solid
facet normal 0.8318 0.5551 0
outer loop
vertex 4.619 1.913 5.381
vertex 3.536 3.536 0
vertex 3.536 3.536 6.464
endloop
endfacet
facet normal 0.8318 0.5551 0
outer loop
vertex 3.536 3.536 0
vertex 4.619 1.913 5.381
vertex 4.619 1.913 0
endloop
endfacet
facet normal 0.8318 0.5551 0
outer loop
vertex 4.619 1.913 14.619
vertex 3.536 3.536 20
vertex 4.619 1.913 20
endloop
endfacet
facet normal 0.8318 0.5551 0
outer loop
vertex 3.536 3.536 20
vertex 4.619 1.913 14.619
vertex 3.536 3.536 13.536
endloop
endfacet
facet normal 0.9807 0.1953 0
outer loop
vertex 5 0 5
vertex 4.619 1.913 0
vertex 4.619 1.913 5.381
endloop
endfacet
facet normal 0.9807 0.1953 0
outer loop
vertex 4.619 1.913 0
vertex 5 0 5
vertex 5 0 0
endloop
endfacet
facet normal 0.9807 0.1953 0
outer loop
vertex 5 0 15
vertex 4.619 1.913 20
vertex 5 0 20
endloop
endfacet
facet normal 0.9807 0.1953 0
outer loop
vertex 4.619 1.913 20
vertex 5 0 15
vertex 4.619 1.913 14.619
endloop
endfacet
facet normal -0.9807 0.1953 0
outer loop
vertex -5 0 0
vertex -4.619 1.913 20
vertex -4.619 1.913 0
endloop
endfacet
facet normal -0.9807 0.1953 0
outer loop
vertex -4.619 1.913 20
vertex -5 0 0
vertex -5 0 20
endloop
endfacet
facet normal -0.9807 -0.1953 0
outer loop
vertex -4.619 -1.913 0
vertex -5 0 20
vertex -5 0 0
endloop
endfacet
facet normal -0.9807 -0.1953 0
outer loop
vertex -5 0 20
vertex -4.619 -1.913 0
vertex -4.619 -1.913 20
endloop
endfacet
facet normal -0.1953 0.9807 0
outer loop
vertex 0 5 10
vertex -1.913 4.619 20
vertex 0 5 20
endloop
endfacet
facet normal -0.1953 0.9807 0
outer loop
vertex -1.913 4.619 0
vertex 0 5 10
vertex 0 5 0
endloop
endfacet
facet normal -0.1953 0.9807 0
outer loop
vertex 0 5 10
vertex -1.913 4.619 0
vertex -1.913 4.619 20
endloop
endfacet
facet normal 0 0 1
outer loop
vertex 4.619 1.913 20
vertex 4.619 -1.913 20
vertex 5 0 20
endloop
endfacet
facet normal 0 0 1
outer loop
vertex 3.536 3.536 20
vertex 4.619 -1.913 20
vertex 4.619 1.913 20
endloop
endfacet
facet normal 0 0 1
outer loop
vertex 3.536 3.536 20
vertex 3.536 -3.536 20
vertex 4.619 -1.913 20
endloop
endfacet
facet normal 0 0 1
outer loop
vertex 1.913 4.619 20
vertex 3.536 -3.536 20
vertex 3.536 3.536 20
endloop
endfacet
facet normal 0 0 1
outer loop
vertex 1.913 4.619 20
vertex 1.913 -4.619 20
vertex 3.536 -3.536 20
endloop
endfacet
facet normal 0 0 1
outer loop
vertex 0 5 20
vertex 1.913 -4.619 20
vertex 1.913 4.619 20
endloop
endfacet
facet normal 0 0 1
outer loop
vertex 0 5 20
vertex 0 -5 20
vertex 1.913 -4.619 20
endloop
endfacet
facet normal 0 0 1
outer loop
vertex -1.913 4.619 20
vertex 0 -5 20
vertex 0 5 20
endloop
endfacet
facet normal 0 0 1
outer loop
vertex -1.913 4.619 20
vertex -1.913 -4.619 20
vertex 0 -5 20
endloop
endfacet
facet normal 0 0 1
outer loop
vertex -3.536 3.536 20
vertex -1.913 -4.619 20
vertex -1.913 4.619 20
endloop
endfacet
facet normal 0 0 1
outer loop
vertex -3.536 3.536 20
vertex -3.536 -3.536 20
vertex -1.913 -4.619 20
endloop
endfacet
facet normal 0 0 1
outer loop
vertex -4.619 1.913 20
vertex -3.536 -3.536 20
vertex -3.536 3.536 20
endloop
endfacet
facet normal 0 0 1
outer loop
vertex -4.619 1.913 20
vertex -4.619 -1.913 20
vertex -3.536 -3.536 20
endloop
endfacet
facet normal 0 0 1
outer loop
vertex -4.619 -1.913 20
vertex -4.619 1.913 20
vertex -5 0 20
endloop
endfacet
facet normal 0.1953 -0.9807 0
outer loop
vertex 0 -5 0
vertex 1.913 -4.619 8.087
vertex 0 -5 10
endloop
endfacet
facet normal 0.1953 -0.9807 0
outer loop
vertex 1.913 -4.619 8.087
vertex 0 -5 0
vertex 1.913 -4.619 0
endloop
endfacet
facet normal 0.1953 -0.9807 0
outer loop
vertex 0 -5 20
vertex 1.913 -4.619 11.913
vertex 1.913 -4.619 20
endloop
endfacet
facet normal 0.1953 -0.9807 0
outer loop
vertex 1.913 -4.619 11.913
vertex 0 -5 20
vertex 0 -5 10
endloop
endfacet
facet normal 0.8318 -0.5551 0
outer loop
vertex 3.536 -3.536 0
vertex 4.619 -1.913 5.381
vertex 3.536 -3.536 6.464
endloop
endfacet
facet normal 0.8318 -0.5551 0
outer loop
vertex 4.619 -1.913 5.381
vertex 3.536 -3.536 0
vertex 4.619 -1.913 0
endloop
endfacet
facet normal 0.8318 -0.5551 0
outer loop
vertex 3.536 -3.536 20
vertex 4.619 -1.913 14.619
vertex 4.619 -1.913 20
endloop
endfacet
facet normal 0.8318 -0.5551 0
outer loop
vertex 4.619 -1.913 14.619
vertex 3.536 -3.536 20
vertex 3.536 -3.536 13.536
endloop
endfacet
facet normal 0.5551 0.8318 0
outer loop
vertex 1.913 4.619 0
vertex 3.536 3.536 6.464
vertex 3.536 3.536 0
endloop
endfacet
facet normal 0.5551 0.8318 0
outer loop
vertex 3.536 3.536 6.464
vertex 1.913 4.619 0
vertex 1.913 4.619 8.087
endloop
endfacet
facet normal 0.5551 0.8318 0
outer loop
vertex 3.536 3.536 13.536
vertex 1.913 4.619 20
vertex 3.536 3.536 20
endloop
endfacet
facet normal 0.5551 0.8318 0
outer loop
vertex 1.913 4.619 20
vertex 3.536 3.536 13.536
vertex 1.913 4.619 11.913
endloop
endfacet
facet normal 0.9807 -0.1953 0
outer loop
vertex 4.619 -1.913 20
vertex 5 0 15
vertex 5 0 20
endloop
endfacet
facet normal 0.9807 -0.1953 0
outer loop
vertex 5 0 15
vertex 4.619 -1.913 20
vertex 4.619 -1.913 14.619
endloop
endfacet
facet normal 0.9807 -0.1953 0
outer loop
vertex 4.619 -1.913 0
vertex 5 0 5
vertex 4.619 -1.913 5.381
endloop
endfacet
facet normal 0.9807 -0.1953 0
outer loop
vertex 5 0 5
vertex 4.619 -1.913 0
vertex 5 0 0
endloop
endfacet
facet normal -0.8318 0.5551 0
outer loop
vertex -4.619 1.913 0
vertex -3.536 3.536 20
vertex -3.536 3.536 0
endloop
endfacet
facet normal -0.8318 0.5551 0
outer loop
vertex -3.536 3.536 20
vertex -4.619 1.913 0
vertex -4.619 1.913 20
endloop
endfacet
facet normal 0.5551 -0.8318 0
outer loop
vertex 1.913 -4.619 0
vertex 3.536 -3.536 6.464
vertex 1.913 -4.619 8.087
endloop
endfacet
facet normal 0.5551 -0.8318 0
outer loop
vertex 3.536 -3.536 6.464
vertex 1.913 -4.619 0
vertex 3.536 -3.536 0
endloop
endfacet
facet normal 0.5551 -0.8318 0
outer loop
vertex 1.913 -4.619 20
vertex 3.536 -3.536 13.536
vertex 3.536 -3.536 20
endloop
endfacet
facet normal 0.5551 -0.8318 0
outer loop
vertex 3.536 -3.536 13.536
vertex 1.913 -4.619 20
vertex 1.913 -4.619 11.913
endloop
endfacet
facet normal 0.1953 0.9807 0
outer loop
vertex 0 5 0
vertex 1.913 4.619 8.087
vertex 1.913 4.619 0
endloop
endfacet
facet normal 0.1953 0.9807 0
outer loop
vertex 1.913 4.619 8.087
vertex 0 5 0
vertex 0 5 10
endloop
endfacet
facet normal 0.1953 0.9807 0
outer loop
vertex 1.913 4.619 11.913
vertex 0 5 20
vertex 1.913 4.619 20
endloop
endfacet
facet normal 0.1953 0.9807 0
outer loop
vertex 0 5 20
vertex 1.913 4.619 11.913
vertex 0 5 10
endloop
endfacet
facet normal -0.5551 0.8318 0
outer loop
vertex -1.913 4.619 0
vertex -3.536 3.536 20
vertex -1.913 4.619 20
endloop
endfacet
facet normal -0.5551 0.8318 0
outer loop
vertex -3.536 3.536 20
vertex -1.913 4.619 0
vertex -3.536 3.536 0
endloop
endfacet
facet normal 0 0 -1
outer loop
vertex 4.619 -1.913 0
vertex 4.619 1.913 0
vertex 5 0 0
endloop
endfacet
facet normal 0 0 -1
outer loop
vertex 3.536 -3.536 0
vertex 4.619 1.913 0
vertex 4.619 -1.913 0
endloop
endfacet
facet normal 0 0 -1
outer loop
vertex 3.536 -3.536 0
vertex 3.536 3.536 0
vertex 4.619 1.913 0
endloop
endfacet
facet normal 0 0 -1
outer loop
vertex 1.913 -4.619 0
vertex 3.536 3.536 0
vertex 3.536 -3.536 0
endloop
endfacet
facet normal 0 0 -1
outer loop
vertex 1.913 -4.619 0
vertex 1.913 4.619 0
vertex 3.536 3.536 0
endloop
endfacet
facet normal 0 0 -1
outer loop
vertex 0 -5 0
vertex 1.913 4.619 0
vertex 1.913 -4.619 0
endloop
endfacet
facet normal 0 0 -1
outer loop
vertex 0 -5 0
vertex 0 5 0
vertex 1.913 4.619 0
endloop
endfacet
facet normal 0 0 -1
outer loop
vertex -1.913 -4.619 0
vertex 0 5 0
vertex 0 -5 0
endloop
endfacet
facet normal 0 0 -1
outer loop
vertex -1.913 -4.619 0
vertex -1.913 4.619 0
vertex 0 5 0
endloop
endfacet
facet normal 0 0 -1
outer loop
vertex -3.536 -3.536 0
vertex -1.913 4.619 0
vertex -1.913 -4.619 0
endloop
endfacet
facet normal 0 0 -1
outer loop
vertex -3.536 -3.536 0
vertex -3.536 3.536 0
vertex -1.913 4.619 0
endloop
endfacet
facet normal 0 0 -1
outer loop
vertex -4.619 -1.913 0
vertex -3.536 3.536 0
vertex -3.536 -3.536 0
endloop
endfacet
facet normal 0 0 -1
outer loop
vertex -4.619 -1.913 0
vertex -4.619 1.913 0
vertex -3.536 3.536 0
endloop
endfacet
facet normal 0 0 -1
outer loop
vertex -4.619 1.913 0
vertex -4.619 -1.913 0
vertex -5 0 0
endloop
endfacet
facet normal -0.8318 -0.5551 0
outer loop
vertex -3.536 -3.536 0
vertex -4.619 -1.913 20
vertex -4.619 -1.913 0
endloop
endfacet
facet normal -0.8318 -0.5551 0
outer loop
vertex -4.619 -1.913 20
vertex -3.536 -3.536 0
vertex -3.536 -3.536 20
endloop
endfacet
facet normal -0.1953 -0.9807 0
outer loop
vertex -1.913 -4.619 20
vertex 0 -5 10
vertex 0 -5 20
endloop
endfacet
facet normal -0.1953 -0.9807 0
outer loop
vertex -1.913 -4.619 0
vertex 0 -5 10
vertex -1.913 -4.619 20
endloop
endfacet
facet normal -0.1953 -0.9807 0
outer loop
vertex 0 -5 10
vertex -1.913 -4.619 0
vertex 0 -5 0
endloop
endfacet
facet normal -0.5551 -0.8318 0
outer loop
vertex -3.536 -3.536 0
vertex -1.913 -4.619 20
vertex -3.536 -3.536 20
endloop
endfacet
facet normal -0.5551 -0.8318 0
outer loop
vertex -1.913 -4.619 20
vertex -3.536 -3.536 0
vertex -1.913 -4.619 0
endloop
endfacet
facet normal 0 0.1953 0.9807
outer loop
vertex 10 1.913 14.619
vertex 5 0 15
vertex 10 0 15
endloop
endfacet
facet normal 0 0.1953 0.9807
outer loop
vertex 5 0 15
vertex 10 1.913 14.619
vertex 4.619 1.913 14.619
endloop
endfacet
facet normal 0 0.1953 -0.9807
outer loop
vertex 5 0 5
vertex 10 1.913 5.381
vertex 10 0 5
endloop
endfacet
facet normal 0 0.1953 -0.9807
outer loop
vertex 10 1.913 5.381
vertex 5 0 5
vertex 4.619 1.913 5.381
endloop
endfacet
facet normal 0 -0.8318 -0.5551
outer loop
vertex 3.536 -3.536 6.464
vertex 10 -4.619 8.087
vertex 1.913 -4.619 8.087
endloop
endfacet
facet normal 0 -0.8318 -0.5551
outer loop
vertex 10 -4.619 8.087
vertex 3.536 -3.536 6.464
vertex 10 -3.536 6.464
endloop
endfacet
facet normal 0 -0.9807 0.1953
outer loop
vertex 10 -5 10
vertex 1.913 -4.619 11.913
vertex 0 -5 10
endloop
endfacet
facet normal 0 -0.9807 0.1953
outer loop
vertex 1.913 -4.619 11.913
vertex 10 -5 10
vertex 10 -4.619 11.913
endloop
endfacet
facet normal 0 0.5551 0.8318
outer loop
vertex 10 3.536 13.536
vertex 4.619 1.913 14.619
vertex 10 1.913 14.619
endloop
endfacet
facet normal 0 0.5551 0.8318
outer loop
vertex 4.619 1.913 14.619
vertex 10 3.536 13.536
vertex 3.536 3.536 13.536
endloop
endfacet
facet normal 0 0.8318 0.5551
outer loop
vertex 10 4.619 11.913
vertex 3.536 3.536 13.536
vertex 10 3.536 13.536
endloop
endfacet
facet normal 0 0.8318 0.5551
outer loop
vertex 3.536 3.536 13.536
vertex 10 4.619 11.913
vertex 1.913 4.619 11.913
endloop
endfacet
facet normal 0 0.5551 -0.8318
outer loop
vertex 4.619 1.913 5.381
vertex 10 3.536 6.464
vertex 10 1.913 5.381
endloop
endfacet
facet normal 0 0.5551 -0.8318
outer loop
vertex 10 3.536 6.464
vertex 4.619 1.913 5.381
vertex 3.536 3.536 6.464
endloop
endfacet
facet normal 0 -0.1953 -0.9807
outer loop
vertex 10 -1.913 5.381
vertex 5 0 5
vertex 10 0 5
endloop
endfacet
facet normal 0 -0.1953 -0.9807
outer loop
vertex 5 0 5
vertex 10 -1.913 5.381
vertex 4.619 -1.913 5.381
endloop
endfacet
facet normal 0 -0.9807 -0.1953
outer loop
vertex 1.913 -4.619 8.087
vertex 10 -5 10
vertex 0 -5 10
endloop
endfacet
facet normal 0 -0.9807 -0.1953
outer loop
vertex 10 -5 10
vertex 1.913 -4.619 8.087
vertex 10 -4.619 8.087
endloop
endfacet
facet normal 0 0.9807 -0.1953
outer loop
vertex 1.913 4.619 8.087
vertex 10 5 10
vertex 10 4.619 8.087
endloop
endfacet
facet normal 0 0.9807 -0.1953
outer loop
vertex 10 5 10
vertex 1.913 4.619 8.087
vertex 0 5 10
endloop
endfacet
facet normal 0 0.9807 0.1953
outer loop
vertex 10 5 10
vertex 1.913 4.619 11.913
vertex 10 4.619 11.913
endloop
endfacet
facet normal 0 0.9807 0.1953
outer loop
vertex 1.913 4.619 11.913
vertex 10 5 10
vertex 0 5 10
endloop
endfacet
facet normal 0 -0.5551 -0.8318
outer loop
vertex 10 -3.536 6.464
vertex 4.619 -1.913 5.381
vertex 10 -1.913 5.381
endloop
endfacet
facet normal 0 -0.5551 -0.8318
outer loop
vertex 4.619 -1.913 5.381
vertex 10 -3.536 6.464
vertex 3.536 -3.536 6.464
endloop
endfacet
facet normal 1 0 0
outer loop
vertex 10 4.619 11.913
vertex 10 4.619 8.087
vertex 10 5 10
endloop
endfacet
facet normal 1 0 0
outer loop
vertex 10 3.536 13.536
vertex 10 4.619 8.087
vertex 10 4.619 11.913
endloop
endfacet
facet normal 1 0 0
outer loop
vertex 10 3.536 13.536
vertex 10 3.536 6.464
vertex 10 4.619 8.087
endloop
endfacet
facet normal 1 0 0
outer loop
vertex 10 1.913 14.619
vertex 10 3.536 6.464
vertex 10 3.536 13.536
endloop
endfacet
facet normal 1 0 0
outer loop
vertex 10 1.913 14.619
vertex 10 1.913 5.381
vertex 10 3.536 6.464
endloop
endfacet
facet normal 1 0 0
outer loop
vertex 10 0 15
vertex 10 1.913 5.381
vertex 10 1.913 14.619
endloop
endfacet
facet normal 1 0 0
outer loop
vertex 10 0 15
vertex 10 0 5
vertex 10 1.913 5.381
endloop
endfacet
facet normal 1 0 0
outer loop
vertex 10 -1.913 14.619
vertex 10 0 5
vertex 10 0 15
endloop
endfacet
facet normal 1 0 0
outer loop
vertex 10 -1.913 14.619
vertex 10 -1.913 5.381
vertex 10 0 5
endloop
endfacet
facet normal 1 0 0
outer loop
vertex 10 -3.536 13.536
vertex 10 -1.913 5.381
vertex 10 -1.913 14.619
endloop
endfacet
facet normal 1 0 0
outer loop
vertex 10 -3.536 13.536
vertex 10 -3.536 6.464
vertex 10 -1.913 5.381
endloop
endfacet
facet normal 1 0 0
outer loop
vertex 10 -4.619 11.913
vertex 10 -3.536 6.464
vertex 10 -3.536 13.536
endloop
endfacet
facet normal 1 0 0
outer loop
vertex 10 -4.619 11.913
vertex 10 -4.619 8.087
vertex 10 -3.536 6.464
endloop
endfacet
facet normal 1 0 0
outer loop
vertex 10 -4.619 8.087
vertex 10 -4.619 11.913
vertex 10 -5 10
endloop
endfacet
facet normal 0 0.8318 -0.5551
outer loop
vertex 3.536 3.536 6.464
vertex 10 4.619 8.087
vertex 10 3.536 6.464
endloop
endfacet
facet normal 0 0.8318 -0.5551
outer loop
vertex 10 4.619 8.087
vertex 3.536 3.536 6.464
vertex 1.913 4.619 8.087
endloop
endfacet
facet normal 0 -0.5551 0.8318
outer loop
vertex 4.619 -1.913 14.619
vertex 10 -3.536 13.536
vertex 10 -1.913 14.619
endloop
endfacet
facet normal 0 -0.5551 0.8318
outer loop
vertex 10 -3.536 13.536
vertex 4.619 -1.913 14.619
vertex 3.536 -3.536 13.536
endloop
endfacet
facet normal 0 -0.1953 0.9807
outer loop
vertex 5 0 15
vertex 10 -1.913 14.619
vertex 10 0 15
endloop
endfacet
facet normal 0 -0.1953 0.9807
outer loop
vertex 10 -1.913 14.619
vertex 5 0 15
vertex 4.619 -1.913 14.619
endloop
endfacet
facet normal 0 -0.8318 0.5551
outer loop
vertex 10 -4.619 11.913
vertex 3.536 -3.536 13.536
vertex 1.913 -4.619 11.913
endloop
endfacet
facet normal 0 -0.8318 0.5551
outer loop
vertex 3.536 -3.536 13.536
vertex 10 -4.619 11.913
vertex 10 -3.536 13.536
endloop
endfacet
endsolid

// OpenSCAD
FNSET = 0; $fn = FNSET;
union() { cylinder(d = 10, h = 20); translate([0, 0, 10]) rotate([0, 90, 0]) cylinder(d = 10, h = 10); }
